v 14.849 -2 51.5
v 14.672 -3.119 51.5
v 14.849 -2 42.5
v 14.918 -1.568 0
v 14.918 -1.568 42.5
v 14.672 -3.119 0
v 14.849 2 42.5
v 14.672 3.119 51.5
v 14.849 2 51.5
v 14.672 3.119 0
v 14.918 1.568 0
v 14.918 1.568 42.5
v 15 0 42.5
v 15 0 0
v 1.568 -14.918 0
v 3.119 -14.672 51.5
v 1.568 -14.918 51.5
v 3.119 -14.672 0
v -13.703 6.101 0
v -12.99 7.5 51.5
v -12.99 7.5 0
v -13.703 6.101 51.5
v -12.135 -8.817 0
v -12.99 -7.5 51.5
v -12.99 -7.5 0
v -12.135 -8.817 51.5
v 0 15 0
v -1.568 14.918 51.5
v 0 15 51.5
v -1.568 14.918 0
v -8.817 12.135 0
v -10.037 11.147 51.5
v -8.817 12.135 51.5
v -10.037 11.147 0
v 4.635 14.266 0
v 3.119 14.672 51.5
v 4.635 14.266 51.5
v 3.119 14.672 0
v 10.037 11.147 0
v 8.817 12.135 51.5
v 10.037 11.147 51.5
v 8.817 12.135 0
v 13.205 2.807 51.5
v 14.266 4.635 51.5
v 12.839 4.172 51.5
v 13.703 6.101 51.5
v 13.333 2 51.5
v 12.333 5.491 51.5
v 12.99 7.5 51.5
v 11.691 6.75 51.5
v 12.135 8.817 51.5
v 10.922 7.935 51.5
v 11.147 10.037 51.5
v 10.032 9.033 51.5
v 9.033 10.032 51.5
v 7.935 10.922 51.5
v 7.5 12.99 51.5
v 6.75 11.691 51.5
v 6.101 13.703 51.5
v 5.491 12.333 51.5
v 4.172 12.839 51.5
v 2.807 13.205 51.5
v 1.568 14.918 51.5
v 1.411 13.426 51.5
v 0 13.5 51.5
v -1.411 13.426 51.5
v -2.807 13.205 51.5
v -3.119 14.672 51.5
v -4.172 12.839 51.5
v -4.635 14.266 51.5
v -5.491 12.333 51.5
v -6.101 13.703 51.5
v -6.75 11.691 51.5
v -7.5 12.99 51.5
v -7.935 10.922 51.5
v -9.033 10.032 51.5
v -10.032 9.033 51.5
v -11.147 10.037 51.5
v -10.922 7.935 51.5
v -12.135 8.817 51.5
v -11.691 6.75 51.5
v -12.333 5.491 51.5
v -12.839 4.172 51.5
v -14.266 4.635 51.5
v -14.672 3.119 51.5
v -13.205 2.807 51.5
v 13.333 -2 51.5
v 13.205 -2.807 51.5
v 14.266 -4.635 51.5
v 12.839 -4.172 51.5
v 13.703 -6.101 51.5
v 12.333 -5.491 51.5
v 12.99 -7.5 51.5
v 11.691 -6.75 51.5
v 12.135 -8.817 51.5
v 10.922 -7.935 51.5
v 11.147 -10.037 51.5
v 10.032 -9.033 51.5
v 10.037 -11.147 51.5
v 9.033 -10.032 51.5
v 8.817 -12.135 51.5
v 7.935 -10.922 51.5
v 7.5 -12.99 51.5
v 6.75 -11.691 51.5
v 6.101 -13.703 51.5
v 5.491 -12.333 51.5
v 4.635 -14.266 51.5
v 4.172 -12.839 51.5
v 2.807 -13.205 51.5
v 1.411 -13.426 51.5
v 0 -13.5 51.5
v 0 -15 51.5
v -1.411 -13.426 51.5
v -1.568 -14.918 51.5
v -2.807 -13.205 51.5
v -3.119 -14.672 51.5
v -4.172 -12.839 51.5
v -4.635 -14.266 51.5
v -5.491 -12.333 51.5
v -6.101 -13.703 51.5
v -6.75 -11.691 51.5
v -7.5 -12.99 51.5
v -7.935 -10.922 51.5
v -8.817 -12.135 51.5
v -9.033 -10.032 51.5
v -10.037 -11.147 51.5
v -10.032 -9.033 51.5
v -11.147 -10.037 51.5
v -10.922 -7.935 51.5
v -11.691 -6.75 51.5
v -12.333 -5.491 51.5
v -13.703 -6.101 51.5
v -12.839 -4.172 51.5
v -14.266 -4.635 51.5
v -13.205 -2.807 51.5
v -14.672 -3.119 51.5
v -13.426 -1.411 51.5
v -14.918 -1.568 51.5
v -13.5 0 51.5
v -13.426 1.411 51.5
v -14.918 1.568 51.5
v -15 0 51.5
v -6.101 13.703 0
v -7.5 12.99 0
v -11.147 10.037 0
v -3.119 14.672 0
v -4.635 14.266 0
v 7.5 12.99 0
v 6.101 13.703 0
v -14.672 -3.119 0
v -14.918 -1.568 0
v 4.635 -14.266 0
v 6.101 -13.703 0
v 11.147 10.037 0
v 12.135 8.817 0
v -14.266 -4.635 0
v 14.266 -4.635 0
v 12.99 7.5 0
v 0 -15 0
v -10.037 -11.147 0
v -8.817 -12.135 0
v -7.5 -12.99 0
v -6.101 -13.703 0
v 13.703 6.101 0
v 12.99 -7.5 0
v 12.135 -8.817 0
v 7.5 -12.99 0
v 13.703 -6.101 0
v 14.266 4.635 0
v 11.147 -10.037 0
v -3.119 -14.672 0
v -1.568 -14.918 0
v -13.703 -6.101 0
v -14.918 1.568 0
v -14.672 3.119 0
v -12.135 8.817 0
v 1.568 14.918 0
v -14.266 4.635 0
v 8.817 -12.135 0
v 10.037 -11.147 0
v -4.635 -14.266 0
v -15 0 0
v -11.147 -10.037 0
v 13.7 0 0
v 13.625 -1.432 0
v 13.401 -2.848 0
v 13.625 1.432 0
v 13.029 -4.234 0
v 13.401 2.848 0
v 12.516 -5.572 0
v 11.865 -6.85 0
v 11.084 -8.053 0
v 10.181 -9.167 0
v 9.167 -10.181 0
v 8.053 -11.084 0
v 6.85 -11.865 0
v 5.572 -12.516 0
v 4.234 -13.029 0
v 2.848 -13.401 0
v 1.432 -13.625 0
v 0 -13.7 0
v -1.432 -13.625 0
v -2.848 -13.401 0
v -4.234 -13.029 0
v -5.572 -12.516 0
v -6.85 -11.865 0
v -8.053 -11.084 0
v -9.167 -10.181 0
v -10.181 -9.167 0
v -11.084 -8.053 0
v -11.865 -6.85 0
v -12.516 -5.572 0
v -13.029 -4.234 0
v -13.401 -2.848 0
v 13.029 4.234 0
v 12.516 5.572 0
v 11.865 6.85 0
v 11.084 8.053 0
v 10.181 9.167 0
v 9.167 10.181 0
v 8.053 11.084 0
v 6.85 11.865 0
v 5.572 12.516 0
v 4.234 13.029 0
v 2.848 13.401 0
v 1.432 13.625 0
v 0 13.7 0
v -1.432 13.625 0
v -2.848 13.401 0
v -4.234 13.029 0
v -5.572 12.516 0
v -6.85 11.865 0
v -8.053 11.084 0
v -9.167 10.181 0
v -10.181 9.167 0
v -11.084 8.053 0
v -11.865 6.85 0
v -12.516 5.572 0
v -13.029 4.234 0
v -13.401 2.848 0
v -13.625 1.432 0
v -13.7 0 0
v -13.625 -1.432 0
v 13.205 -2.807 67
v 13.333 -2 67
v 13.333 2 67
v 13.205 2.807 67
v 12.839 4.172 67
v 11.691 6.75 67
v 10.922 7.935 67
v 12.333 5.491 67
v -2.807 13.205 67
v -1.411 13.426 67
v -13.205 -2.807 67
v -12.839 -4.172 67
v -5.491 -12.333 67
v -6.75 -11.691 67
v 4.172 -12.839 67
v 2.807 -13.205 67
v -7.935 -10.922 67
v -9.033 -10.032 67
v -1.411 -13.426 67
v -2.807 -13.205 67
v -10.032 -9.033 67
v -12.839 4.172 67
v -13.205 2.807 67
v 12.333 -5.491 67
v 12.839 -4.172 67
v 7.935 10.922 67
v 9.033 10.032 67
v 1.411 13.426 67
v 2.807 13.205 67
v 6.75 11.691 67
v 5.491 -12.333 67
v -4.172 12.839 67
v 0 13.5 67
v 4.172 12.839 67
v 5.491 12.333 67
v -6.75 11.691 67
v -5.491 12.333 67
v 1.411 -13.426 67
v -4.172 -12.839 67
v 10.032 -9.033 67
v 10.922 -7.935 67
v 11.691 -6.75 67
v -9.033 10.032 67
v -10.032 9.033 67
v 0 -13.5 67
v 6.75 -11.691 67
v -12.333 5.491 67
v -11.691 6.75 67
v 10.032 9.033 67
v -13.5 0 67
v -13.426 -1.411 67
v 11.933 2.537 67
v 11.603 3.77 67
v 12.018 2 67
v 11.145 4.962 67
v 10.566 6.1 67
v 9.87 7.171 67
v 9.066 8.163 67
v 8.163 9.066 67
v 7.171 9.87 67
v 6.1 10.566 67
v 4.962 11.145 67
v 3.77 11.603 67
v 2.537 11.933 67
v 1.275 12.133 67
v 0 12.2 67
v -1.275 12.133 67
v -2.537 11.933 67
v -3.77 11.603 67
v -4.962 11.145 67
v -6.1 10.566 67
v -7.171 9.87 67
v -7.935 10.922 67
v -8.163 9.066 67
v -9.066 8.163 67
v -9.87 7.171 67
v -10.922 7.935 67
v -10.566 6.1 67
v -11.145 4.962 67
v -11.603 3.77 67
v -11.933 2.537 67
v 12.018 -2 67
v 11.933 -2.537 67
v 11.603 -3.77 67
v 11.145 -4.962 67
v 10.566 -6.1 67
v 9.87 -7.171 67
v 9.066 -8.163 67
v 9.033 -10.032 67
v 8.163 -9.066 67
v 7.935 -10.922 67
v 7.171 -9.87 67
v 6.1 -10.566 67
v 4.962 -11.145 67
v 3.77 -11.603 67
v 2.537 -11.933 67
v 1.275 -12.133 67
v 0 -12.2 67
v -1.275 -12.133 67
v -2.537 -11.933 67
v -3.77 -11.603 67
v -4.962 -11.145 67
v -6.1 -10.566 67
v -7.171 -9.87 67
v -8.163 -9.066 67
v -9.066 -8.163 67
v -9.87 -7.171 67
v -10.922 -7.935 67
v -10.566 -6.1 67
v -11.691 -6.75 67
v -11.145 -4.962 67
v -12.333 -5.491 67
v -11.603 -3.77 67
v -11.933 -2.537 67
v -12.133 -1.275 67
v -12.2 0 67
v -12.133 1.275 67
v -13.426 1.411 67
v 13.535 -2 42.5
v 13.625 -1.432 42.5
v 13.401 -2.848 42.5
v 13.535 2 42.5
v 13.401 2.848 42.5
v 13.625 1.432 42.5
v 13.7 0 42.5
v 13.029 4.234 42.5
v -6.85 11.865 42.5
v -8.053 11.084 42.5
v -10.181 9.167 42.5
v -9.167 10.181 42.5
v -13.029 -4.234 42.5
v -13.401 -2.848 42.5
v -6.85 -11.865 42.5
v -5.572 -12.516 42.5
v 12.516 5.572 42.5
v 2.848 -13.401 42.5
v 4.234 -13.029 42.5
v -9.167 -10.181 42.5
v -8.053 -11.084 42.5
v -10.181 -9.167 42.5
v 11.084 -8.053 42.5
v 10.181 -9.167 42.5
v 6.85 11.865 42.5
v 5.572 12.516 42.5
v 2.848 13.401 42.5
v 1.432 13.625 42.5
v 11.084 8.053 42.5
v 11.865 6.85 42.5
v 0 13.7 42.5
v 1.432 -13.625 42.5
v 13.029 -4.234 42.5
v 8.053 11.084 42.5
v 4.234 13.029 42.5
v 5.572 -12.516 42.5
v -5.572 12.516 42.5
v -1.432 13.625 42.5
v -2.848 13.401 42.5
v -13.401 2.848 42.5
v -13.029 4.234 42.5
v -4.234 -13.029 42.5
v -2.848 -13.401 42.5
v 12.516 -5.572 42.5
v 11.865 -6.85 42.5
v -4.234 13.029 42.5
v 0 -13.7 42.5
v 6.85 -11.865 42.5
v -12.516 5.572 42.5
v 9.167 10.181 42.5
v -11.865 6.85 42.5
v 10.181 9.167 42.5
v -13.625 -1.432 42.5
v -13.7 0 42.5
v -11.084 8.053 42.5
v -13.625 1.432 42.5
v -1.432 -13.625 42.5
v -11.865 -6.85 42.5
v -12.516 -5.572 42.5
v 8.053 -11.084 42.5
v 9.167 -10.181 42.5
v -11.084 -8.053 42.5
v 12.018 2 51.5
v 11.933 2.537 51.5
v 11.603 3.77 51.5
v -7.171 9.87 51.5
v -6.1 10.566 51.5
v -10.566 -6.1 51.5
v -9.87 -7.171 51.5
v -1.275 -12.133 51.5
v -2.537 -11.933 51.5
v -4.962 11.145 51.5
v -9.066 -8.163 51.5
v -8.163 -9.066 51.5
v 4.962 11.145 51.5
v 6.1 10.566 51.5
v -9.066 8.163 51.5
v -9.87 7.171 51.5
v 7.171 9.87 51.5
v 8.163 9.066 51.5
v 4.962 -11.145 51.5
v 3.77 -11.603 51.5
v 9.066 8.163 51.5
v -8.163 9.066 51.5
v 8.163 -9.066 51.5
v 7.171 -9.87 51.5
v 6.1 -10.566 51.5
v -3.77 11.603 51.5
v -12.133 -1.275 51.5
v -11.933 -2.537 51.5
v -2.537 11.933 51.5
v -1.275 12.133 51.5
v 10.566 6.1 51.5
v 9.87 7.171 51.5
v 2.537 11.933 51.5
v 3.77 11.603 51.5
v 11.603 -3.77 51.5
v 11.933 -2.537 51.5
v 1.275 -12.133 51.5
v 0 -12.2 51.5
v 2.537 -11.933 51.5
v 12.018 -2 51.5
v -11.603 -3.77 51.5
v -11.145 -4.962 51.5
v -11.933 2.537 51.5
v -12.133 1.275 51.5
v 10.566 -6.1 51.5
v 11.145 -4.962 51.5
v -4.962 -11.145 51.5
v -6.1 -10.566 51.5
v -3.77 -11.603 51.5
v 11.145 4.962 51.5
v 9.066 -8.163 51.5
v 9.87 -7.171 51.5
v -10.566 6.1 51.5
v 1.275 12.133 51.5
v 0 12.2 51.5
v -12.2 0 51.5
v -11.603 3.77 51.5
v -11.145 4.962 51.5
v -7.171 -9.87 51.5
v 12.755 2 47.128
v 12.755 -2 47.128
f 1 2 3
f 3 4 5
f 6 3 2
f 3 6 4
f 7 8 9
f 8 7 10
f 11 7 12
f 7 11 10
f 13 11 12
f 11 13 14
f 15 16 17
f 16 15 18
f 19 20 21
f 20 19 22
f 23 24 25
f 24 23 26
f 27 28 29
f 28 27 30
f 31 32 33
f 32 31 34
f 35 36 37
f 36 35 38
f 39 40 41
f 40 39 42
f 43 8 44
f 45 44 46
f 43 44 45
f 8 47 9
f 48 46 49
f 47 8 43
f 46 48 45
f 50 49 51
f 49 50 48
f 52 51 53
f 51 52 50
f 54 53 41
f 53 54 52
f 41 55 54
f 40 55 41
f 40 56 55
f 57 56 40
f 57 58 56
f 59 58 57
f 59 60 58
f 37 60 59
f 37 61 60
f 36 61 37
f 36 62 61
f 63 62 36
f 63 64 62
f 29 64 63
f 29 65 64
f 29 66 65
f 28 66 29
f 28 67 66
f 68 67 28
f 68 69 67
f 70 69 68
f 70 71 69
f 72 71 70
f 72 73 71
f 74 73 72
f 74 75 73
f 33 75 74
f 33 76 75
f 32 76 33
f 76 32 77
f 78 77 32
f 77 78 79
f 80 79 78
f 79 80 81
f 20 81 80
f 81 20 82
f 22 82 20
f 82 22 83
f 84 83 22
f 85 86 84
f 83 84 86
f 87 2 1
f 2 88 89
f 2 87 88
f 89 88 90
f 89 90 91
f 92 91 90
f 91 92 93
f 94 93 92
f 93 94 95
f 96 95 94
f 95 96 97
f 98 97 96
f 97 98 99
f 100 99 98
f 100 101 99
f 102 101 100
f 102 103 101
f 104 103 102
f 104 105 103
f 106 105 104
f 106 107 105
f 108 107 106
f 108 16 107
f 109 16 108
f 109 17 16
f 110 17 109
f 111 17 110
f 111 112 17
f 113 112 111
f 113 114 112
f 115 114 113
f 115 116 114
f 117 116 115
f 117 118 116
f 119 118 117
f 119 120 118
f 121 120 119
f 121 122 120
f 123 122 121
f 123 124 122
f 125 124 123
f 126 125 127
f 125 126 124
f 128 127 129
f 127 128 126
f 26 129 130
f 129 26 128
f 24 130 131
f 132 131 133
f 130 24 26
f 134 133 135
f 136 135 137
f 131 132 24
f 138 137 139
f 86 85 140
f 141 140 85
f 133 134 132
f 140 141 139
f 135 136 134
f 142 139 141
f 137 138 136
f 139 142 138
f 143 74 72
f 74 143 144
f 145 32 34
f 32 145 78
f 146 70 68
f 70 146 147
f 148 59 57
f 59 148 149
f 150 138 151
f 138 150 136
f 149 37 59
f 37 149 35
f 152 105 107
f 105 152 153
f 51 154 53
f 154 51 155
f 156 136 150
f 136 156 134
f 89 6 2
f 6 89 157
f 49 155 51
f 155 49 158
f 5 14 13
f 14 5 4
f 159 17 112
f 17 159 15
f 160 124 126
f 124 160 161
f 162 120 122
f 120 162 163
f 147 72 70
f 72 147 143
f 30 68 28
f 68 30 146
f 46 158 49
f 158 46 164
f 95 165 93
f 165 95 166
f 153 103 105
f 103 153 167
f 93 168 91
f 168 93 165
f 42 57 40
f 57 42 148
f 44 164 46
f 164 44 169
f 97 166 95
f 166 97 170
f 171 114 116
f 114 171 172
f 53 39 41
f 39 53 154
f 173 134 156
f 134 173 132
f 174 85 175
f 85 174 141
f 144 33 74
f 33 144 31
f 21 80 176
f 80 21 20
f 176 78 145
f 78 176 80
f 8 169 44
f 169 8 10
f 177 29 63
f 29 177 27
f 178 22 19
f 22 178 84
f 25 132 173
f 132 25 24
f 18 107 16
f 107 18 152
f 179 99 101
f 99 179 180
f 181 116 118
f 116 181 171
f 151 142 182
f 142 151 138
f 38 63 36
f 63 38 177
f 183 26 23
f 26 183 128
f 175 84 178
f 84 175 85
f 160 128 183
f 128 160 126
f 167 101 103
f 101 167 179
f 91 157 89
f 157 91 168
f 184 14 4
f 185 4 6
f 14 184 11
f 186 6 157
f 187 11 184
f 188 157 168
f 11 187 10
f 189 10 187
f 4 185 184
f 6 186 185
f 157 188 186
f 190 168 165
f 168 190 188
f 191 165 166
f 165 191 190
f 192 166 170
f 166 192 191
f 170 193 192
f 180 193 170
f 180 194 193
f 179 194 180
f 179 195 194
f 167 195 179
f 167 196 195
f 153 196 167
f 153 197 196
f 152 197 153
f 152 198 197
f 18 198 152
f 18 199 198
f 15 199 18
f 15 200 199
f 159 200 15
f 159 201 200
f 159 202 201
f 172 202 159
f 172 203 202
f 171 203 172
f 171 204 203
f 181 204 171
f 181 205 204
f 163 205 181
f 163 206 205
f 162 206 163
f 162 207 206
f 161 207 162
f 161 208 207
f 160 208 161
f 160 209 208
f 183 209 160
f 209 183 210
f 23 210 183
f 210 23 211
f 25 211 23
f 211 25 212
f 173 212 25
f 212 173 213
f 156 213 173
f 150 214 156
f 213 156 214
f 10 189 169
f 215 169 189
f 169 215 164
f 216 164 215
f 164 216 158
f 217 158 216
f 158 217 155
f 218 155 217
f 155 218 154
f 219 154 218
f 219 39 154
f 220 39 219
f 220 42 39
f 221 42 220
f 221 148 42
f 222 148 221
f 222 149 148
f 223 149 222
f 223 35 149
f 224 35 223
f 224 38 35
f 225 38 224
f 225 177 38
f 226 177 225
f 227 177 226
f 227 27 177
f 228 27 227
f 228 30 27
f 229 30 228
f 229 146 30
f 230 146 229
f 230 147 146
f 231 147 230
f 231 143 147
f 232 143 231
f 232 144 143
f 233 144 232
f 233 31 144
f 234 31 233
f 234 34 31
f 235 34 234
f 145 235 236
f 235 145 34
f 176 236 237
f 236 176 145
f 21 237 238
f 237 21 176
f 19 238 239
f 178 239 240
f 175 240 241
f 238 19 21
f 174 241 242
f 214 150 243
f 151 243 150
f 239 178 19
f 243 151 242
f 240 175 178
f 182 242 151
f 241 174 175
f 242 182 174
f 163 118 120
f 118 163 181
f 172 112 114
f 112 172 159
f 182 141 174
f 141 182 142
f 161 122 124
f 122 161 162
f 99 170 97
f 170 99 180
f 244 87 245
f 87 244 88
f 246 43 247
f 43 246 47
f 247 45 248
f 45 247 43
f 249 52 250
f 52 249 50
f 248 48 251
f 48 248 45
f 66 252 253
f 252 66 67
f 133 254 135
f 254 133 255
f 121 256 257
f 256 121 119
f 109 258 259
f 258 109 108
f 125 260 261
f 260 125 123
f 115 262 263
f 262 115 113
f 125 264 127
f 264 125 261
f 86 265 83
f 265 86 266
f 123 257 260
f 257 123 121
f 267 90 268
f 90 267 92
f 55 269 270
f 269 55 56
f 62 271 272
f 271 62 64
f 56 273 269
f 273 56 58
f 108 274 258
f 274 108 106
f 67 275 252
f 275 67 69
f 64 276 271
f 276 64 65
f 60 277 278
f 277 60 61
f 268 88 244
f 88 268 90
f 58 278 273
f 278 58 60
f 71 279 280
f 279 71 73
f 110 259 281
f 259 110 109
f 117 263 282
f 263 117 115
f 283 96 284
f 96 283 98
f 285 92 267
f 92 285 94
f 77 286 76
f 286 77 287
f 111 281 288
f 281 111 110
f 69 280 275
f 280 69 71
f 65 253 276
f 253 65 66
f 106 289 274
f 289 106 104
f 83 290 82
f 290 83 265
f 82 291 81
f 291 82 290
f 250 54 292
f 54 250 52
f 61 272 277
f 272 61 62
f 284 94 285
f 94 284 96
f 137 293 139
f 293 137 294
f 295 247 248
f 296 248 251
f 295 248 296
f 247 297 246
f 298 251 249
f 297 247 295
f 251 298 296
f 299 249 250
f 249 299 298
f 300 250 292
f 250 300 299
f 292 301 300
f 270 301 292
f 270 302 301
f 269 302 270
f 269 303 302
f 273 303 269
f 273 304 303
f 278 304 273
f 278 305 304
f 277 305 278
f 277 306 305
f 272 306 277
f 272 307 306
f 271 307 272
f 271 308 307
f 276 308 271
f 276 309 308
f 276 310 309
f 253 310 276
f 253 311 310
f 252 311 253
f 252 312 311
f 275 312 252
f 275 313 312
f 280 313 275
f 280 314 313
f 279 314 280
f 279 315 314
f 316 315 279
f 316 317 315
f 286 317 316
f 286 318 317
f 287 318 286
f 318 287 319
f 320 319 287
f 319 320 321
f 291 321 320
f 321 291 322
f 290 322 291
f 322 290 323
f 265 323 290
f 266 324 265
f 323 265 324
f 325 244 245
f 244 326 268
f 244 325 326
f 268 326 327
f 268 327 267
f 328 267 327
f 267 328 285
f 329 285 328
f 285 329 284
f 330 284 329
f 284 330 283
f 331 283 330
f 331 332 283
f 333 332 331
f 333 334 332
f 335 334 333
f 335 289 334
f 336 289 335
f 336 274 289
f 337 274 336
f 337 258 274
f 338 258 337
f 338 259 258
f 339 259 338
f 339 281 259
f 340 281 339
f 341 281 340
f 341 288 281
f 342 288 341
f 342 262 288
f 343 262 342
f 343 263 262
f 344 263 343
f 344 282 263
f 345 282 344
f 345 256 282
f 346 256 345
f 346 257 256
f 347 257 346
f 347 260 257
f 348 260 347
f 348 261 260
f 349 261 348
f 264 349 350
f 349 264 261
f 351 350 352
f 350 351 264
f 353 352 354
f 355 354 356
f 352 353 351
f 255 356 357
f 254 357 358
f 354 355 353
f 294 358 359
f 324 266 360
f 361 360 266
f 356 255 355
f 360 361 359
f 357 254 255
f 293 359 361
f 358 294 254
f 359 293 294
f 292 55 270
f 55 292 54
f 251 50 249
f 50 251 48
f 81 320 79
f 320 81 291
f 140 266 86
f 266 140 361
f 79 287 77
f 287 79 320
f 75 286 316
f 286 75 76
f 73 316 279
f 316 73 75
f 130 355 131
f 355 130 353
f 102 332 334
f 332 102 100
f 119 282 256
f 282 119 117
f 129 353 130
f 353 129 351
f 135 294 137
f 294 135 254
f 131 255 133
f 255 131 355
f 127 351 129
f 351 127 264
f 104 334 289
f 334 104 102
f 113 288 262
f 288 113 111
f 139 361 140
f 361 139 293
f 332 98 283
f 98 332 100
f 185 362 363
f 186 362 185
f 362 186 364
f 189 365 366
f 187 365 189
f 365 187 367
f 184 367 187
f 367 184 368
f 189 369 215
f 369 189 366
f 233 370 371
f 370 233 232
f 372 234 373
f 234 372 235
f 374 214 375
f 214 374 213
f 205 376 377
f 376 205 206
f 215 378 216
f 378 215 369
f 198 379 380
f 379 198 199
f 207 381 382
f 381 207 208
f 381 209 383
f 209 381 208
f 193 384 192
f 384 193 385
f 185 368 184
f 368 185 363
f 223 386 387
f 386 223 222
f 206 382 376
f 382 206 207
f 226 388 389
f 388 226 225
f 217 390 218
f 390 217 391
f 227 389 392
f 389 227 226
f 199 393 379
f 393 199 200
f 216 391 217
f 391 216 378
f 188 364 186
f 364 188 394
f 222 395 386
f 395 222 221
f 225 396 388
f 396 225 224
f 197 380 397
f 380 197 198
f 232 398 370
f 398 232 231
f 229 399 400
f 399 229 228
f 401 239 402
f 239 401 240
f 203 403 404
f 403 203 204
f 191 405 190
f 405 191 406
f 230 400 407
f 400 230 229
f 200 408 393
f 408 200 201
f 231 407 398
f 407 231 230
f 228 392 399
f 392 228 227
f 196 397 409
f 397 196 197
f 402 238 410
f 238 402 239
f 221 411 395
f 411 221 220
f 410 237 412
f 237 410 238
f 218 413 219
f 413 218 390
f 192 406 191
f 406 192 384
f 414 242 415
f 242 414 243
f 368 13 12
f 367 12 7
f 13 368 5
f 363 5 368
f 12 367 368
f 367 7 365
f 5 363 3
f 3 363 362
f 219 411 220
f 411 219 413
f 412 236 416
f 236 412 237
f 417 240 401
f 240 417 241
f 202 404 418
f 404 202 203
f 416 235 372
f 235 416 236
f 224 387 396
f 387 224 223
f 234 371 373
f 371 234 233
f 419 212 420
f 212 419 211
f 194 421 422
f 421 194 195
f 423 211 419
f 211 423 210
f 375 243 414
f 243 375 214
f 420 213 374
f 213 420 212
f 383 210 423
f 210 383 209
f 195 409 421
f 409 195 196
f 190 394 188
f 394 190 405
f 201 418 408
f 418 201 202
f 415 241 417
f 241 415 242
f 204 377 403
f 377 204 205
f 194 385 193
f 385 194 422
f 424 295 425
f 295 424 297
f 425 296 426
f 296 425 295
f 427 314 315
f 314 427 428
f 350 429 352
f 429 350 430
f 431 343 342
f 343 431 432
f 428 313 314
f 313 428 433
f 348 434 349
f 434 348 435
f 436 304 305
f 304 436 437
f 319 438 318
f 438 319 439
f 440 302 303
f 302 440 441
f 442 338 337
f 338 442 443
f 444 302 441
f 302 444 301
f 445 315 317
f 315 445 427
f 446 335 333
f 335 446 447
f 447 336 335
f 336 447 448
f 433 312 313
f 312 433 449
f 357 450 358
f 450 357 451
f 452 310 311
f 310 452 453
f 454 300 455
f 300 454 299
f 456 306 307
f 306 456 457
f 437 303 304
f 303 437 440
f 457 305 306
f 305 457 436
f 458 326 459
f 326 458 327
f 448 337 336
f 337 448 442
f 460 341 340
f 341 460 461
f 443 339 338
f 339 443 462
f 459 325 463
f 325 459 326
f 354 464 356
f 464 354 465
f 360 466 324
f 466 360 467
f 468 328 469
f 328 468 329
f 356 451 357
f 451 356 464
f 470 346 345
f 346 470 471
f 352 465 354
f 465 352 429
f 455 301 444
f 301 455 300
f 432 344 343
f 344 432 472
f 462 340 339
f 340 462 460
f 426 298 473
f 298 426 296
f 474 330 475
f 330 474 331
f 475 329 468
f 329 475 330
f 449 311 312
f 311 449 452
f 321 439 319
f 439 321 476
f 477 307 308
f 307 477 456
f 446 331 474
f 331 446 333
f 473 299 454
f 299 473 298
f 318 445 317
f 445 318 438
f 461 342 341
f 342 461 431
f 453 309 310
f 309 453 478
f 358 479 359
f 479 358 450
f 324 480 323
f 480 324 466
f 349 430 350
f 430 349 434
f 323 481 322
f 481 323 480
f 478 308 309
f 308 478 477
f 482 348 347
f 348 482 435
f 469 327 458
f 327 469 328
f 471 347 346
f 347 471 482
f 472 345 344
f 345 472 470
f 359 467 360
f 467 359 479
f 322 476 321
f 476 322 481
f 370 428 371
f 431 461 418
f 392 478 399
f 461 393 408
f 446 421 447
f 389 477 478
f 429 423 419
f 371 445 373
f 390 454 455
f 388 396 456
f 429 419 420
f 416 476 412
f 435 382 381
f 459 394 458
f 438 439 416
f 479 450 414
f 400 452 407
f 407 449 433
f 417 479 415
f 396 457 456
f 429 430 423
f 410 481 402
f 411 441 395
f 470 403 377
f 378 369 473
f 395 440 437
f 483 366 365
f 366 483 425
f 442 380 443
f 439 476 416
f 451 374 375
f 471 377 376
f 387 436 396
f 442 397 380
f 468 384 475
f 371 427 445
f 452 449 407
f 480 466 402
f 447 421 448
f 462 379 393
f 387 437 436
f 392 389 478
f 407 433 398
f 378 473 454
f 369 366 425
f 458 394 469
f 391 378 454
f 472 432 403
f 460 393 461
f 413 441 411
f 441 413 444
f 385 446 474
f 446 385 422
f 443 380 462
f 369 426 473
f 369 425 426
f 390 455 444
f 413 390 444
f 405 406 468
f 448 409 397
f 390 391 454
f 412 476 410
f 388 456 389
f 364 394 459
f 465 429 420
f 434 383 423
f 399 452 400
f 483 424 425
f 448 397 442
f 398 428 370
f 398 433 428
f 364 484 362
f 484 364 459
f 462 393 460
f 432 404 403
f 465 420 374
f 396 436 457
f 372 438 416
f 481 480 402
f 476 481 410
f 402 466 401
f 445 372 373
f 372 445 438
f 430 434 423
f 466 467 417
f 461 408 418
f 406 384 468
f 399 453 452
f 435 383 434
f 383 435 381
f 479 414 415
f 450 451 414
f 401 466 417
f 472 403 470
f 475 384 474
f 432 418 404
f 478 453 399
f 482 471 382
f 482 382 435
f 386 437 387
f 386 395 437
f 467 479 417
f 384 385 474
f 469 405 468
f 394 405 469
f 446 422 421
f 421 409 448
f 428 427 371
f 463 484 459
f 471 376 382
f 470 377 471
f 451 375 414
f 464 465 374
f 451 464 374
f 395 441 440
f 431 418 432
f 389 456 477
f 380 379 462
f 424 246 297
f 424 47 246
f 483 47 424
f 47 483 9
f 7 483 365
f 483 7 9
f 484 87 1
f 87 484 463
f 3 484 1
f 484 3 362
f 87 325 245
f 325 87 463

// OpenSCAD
lower_height = 51.5; // mm, height of bottom part
lower_radius=30/2; // mm, outer radius of bottom part
upper_height = 15.5; // mm, height of top part
upper_radius=27/2; // mm, outer radius of top part
overlap = 9; // mm
slotwidth = 4; // mm
lower_wallwidth = 1.3; // mm
upper_wallwidth = 1.3; // mm

difference() {
union() {
    // These are the two cylinders
    translate ([0,0,0]) cylinder(r=lower_radius,h=lower_height, $fn=60);
    translate ([0,0,lower_height]) cylinder(r=upper_radius,h=upper_height, $fn=60);
}
// Below are the parts to cut out
union() {
    // Inside the bottom cylinder (up to the overlap)
    translate ([0,0,-1]) cylinder(r=lower_radius-lower_wallwidth,h=lower_height+1-overlap,$fn=60);
    // Inside the top cylinder
    translate ([0,0,lower_height-1]) cylinder(r=upper_radius-upper_wallwidth,h=upper_height+2,
    $fn=60);
    // The overlap (a truncated cone)
    translate ([0,0,lower_height-overlap]) cylinder(r1=lower_radius-lower_wallwidth,r2=upper_radius-upper_wallwidth,h=overlap, $fn=60);
    // the slot starts at the bottom of the "overlap"
    translate([lower_radius-upper_wallwidth*3,-slotwidth/2,lower_height-overlap]) cube([upper_wallwidth*3,slotwidth,upper_height+overlap+1]);
    }
}


 
